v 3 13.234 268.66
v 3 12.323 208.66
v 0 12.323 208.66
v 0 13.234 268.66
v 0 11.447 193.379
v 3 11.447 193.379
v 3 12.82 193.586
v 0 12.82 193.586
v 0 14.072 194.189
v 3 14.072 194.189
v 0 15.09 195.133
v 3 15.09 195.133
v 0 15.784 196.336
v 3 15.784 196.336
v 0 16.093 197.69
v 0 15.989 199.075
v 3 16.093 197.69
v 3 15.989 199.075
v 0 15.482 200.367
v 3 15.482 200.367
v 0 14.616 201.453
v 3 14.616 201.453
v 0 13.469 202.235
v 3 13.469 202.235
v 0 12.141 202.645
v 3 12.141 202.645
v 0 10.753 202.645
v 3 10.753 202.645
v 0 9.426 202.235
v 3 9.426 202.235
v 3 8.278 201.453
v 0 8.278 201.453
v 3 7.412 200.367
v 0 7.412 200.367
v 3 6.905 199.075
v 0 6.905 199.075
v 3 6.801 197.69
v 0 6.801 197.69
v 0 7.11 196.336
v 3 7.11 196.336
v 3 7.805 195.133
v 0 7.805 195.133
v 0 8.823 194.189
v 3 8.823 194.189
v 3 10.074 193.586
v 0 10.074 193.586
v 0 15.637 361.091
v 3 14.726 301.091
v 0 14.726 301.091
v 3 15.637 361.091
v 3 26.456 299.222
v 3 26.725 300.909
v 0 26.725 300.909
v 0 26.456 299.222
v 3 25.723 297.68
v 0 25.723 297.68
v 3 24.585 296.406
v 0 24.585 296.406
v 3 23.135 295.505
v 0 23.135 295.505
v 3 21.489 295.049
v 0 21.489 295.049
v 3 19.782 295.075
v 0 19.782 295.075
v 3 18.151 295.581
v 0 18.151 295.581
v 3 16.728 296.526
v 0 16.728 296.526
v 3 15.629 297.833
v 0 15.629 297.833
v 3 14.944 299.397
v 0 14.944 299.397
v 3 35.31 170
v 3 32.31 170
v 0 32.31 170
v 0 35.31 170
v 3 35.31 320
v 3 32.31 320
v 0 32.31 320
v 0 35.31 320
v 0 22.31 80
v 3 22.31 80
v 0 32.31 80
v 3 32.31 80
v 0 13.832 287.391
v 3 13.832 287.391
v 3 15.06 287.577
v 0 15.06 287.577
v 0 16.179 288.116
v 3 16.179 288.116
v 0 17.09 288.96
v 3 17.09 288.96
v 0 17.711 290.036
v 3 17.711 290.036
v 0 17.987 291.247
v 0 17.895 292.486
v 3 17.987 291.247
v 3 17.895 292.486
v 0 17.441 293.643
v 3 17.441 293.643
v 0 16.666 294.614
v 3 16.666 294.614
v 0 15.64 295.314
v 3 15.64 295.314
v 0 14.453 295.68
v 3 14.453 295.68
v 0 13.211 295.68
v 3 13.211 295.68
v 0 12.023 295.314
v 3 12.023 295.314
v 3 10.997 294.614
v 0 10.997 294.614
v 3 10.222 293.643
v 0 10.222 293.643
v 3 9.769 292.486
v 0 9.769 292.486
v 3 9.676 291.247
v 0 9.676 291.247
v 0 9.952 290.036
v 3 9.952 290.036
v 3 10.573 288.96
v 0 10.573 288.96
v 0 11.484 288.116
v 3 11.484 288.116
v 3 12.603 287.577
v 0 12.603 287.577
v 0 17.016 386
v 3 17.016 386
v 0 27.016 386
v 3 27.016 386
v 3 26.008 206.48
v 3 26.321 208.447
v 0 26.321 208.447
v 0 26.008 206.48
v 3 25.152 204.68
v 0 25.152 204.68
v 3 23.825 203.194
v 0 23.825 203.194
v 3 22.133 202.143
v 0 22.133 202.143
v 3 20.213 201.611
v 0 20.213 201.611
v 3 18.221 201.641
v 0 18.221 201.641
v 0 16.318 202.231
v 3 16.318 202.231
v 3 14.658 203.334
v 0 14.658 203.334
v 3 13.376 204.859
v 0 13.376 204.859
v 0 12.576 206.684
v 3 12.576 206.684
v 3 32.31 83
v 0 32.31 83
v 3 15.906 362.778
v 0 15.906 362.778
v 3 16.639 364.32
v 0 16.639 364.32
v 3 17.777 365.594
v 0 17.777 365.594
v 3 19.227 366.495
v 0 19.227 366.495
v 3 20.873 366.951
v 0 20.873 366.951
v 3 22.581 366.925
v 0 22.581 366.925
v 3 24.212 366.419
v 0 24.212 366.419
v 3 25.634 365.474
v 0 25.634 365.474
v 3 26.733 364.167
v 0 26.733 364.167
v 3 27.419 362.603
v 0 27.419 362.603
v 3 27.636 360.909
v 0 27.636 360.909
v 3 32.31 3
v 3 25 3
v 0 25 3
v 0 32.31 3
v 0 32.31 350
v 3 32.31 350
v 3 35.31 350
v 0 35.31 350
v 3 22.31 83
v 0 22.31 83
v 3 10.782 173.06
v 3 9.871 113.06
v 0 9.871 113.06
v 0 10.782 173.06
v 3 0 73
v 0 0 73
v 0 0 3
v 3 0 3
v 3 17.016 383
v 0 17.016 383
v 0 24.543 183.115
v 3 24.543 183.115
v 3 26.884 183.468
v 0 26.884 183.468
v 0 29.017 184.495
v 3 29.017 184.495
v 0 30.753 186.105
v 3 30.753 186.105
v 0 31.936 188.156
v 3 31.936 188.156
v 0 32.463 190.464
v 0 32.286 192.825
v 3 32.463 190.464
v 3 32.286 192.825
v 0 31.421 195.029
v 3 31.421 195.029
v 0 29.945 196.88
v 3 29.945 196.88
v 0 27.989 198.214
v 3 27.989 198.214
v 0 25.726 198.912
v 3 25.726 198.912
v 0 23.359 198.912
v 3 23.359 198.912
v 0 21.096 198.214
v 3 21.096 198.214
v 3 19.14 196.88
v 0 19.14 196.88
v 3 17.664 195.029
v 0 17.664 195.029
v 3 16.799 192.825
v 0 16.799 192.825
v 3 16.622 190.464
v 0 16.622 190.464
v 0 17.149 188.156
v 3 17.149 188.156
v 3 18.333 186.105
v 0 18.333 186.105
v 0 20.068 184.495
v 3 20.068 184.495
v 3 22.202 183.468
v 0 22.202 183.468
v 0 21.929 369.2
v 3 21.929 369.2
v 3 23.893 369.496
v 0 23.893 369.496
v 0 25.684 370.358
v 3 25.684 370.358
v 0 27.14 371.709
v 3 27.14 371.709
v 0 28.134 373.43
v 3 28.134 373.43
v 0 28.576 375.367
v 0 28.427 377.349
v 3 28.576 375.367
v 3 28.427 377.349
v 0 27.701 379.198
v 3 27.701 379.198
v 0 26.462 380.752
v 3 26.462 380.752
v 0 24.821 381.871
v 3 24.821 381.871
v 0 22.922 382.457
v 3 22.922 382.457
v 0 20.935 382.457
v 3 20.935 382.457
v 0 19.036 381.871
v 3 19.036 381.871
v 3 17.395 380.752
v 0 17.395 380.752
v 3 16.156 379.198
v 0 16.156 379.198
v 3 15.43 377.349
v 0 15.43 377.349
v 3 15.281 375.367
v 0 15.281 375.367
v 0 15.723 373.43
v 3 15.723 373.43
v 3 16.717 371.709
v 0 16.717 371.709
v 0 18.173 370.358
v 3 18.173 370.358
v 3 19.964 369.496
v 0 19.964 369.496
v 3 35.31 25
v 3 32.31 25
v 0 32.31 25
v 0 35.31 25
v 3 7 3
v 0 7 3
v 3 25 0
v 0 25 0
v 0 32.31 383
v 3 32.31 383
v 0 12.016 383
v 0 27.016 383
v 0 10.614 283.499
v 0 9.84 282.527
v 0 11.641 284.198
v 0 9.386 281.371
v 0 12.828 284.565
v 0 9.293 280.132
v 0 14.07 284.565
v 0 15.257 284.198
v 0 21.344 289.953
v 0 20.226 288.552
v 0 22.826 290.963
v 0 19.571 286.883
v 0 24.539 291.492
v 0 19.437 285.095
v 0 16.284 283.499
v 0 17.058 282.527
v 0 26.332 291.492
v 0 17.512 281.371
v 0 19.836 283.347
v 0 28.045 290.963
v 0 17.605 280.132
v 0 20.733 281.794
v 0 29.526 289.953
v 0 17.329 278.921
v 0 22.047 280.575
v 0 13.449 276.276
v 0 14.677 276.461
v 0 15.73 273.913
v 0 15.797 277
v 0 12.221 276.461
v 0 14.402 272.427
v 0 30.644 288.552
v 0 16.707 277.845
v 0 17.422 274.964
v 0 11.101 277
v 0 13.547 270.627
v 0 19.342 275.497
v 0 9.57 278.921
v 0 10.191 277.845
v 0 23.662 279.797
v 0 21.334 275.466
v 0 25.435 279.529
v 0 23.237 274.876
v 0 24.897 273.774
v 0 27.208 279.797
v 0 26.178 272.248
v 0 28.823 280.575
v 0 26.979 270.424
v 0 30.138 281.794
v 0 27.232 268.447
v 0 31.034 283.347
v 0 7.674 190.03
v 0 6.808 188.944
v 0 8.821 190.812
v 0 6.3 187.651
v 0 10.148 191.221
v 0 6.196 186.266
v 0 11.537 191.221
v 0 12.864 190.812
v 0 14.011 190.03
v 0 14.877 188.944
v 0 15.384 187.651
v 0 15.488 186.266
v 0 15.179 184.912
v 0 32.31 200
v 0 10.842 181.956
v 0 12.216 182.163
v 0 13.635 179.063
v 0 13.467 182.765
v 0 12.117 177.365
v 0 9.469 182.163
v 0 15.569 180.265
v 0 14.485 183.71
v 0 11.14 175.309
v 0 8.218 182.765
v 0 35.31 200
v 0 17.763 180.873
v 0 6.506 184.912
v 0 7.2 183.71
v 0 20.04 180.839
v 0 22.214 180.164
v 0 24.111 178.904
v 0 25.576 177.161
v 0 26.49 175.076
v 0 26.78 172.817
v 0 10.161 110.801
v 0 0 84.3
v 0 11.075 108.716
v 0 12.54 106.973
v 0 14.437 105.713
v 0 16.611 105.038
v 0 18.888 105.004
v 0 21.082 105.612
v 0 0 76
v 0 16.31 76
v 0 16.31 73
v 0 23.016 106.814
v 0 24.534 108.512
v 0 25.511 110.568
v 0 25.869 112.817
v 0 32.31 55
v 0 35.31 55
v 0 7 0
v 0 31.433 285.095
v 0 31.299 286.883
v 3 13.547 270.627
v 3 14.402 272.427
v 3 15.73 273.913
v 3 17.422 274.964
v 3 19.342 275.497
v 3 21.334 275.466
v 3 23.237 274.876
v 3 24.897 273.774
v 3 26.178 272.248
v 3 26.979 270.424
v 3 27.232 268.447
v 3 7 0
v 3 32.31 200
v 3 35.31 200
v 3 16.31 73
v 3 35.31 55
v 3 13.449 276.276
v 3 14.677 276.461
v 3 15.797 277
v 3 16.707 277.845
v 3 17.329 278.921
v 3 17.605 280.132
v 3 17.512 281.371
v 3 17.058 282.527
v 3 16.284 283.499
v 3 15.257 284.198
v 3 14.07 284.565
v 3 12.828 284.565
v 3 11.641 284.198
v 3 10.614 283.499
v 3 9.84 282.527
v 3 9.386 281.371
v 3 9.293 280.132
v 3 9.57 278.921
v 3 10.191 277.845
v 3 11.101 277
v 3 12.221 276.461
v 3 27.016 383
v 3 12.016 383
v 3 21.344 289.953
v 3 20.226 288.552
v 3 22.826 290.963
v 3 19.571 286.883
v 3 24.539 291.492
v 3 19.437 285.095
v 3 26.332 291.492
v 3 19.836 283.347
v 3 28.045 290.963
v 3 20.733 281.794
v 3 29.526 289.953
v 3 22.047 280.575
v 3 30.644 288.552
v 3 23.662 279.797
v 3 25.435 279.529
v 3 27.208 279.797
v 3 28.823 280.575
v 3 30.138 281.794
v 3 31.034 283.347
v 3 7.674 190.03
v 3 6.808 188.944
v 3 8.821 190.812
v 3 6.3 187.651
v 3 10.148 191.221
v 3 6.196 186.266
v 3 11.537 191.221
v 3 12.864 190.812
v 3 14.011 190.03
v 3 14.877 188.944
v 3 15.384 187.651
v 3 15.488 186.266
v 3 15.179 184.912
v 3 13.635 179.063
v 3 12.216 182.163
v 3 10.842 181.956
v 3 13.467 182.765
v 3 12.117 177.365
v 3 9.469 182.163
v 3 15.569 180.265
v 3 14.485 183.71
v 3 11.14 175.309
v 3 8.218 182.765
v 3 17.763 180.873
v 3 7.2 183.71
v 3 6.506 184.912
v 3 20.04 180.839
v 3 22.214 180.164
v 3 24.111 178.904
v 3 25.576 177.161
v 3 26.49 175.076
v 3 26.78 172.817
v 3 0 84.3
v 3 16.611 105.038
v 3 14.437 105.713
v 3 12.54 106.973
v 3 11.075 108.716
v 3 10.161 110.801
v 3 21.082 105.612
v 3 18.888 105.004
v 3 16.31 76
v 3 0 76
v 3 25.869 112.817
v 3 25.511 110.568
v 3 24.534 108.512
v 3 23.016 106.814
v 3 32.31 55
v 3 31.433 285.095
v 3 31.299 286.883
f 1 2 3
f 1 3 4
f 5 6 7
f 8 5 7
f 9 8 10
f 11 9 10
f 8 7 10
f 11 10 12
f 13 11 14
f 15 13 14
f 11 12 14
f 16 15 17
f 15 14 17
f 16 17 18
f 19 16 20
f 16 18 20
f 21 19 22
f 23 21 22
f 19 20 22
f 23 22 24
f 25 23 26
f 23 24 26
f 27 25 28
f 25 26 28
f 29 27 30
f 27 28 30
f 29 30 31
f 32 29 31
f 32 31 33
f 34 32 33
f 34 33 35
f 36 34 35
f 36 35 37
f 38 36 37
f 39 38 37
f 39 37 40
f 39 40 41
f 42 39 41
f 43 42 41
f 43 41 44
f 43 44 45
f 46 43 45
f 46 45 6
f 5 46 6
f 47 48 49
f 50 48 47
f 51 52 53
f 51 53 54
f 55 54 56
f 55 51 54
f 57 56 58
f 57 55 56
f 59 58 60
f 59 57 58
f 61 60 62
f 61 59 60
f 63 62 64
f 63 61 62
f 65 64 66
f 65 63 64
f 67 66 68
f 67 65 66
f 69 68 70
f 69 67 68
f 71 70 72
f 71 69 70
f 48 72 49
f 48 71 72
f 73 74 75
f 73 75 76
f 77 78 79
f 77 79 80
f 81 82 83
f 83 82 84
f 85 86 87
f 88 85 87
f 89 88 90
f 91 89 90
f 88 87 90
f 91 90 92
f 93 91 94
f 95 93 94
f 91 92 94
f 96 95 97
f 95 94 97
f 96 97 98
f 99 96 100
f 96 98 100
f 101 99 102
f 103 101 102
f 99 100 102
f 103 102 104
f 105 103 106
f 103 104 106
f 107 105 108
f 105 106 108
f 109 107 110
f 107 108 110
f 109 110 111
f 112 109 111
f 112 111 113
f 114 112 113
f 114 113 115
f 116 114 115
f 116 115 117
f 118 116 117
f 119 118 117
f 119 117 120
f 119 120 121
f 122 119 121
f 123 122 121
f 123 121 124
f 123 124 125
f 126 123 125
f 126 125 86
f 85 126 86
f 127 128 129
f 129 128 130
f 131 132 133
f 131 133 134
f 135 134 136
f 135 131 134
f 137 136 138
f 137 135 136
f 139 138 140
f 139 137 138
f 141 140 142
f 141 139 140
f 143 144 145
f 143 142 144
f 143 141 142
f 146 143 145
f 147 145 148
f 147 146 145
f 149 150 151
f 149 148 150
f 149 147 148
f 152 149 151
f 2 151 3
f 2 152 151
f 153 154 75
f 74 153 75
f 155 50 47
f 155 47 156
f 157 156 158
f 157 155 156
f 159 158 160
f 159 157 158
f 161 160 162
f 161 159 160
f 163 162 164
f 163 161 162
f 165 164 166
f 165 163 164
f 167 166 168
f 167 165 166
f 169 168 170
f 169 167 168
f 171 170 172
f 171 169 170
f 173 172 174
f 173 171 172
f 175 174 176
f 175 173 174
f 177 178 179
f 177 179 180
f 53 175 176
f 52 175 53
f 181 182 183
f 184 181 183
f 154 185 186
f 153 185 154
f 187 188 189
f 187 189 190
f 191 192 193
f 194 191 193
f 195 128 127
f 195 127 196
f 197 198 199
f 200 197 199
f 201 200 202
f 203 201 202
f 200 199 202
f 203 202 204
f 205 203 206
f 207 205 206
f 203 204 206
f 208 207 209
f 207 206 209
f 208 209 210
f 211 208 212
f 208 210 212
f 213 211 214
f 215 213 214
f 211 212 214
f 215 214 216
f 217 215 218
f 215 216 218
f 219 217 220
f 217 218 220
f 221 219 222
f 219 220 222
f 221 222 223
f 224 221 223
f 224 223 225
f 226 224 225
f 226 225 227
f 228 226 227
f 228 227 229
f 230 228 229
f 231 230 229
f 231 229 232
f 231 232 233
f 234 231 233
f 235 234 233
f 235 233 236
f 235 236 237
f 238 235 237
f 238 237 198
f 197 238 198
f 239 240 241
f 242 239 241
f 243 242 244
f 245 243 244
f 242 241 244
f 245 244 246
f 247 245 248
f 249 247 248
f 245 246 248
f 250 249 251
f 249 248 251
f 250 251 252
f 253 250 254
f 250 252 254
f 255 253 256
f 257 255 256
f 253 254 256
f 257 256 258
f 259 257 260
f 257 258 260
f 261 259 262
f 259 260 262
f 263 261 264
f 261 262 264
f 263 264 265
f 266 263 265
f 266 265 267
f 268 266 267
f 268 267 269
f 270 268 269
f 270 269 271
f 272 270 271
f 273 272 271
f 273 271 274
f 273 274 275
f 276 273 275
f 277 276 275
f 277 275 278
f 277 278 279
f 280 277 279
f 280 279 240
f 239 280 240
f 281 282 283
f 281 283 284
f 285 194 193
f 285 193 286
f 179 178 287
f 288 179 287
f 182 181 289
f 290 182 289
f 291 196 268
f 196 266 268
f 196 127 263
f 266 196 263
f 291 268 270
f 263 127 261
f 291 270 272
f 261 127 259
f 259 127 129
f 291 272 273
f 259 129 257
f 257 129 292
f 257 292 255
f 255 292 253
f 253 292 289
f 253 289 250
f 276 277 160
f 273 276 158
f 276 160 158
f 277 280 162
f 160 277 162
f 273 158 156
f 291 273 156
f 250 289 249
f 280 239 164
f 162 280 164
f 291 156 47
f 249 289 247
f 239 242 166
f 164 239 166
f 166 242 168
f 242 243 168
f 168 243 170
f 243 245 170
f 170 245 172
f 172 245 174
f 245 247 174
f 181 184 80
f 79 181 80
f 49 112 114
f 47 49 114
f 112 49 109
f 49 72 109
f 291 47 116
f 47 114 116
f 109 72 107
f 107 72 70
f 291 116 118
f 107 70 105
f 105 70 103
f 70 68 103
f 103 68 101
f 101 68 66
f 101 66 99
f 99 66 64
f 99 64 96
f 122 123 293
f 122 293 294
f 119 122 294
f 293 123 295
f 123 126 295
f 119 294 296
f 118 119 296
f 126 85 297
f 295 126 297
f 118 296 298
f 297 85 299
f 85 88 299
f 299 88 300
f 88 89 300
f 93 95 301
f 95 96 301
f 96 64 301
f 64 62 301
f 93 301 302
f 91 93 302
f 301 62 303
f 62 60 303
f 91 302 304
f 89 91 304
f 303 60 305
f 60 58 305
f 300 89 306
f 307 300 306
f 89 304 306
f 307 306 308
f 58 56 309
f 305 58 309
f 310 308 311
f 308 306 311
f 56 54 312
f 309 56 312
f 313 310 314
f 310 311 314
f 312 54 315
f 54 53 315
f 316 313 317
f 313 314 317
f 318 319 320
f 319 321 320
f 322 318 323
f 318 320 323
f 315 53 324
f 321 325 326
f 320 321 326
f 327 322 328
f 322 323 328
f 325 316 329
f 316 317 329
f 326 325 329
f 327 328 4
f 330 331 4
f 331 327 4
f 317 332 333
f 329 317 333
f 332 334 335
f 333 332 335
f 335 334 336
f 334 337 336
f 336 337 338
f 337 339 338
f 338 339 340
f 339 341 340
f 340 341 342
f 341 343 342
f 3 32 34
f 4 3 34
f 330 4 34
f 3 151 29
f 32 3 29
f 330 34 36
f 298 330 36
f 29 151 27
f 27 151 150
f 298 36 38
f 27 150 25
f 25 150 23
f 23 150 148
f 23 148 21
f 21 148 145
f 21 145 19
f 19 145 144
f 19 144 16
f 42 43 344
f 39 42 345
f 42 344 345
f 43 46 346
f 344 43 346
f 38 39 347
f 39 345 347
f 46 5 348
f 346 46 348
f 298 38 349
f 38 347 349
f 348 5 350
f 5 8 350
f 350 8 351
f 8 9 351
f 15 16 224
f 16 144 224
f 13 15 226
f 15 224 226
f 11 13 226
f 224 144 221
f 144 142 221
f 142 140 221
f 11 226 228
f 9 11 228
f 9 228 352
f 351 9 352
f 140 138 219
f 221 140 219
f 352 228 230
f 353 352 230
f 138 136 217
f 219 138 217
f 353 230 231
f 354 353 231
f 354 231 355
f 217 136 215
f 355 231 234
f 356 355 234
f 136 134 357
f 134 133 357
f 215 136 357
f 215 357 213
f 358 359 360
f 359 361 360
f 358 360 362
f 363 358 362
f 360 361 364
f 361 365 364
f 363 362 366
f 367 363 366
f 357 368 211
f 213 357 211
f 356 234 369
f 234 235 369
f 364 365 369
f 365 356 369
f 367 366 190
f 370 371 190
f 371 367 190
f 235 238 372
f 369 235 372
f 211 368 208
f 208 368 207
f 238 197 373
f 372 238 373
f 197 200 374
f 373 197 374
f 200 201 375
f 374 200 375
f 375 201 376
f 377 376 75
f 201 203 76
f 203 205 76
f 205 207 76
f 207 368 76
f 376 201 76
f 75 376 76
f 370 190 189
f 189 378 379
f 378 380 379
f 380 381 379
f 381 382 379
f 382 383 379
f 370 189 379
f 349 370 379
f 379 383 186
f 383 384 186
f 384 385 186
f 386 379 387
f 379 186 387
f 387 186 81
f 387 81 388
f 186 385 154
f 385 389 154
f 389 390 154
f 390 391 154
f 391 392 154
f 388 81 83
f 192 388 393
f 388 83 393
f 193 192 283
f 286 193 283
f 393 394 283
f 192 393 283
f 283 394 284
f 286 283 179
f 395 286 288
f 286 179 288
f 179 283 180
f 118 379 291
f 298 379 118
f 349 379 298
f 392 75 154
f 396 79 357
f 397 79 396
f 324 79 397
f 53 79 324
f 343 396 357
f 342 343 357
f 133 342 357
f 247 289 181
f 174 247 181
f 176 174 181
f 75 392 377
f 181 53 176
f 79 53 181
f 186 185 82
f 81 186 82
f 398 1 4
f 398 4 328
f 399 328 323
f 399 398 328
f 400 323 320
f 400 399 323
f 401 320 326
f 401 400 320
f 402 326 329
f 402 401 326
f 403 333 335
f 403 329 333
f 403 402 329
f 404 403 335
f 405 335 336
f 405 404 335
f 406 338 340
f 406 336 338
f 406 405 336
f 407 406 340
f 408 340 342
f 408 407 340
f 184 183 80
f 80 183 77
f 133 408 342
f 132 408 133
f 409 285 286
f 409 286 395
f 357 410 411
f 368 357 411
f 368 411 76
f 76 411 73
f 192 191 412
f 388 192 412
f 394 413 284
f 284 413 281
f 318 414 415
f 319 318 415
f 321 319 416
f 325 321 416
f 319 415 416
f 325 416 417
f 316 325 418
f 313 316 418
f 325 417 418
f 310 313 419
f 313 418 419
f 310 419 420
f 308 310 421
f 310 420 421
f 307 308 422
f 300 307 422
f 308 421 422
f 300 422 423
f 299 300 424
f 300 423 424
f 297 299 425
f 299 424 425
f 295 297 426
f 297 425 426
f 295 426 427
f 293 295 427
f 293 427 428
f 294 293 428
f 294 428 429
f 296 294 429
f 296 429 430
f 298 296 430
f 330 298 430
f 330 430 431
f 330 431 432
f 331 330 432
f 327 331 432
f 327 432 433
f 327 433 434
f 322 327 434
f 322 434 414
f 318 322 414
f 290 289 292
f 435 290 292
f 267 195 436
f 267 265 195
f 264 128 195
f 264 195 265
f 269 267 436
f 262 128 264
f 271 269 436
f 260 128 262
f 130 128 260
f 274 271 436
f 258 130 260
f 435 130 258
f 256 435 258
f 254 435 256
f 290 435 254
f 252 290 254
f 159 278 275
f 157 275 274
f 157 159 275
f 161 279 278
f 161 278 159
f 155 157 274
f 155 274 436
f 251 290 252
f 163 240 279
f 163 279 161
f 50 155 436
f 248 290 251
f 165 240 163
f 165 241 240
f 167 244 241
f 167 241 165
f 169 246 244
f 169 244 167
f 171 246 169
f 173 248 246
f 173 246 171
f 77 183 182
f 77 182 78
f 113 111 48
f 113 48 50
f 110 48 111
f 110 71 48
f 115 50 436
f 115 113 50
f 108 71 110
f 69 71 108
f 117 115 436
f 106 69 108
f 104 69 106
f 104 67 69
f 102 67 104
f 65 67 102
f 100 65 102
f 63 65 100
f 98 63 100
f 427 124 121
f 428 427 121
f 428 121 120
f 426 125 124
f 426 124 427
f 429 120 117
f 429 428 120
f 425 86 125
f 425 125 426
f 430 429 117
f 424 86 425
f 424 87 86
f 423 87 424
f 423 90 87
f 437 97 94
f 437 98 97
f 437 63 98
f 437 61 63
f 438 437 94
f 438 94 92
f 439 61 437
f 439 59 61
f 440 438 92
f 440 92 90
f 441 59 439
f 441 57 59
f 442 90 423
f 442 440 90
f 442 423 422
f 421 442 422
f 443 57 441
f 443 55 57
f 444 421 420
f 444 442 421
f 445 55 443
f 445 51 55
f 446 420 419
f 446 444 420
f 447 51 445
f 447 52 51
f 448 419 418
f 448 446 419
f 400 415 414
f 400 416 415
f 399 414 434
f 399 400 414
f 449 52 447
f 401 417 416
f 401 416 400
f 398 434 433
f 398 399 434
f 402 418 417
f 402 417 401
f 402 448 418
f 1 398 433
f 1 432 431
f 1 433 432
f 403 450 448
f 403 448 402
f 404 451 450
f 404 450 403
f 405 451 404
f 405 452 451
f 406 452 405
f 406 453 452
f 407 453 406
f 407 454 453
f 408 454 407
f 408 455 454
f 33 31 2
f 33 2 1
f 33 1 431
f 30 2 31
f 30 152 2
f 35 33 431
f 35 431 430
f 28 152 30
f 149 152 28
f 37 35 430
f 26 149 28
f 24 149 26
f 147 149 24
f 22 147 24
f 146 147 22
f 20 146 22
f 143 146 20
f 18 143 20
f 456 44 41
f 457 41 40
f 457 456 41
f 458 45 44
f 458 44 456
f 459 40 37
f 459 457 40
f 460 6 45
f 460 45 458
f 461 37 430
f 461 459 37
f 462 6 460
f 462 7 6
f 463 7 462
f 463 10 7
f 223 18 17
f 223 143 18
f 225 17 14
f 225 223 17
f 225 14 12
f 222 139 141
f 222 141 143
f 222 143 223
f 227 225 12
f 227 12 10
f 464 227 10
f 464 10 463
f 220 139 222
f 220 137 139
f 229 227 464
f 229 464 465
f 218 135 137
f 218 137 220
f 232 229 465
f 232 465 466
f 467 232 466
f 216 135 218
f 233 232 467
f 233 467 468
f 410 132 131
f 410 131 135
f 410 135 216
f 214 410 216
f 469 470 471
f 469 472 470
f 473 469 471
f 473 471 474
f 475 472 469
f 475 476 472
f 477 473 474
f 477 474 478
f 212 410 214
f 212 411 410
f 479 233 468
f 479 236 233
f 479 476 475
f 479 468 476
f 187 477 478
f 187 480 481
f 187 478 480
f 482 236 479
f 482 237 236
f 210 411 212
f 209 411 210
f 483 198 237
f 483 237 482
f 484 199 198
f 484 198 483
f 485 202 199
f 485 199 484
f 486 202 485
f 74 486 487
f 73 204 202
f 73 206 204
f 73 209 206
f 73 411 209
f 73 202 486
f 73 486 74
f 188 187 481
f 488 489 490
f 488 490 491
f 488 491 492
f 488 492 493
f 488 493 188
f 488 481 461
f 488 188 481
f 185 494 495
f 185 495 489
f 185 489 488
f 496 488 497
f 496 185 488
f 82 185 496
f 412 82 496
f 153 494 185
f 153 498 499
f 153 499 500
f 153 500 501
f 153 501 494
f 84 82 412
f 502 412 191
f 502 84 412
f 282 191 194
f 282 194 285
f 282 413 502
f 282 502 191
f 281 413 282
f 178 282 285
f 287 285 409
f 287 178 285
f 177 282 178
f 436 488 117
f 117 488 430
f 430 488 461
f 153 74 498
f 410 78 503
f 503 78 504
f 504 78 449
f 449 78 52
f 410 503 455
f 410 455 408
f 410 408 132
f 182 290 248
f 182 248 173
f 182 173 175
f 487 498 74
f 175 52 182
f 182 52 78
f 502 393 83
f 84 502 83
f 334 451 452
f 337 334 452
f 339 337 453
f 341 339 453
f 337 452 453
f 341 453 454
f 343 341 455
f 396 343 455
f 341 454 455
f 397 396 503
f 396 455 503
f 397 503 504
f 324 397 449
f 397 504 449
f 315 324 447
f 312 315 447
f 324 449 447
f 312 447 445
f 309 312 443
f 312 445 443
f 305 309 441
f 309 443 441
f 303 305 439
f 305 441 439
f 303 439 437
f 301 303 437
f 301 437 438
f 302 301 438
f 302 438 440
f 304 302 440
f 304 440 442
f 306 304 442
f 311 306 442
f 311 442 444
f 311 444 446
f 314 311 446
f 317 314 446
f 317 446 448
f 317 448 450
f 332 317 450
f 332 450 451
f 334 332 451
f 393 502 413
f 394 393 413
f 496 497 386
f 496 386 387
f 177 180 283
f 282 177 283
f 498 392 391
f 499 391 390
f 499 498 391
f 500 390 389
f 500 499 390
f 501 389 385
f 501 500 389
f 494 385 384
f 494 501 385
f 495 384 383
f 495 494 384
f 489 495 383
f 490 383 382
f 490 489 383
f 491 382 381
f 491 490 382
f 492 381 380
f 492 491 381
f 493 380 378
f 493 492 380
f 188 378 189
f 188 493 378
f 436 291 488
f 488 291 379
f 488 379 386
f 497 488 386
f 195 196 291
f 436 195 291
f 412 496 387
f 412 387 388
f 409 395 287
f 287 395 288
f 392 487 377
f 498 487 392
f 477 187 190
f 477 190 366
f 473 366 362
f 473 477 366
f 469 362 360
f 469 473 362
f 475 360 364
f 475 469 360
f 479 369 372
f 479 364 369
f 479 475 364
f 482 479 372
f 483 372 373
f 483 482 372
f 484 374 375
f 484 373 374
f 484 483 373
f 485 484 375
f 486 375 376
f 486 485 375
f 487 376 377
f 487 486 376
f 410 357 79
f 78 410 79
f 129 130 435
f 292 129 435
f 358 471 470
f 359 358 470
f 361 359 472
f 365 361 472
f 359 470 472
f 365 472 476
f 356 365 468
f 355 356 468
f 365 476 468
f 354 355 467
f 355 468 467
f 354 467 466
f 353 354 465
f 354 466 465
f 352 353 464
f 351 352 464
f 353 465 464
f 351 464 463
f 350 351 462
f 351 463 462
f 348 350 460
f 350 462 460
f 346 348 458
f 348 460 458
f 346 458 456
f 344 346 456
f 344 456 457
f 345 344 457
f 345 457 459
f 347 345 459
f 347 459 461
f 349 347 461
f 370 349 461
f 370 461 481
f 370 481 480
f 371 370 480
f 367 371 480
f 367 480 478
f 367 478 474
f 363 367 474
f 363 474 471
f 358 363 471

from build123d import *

# Parameters (mm, degrees)
BOSS_EXTRUDE1_DEPTH = 3
SKETCH2_W           = 3
SKETCH2_H           = 10
SKETCH2_W_2         = 30
SKETCH2_H_2         = 3
BOSS_EXTRUDE2_DEPTH = 3
CUT_EXTRUDE1_DEPTH  = 10
SKETCH4_W           = 3
SKETCH4_H           = 10
SKETCH4_H_2         = 16.31
CUT_EXTRUDE2_DEPTH  = 10
SKETCH5_W           = 3
SKETCH5_H           = 13.703534411
SKETCH5_H_2         = 13.791377581
CUT_EXTRUDE3_DEPTH  = 10
SKETCH6_R           = 6.665876203
SKETCH6_R_2         = 6.014739453
SKETCH6_R_3         = 4.167493344
SKETCH6_R_4         = 7.942691131
SKETCH6_R_5         = 4.658905865
CUT_EXTRUDE4_DEPTH  = 10


with BuildPart() as part:
    # Sketch1 → Boss-Extrude1 (new body)
    with BuildSketch(Plane(origin=(0, 0, 0), x_dir=(0, 0, -1), z_dir=(1, 0, 0))):
        Polygon((-383, 12.016330065), (-84.3, 0), (0, 0), (0, 32.31), (-383, 32.31), align=None)
    extrude(amount=BOSS_EXTRUDE1_DEPTH)

    # Sketch2 → Boss-Extrude2 (add)
    with BuildSketch(Plane(origin=(3, 0, 0), x_dir=(0, 0, -1), z_dir=(1, 0, 0))):
        with Locations((-384.5, 22.016330065)):
            Rectangle(SKETCH2_W, SKETCH2_H)
        with Locations((-335, 33.81)):
            Rectangle(SKETCH2_W_2, SKETCH2_H_2)
        with Locations((-40, 33.81)):
            Rectangle(SKETCH2_W_2, SKETCH2_H_2)
        with Locations((-185, 33.81)):
            Rectangle(SKETCH2_W_2, SKETCH2_H_2)
    extrude(amount=-BOSS_EXTRUDE2_DEPTH)

    # Sketch3 → Cut-Extrude1 (cut)
    with BuildSketch(Plane(origin=(3, 0, 0), x_dir=(0, 0, -1), z_dir=(1, 0, 0))):
        with BuildLine():
            Line((-360.908901745, 27.636018628), (-300.908901745, 26.724931053))
            ThreePointArc((-300.908901745, 26.724931053), (-295.000691614, 20.634524412), (-301.091098255, 14.726314282))
            Line((-301.091098255, 14.726314282), (-361.091098255, 15.637401857))
            ThreePointArc((-361.091098255, 15.637401857), (-366.999308386, 21.727808498), (-360.908901745, 27.636018628))
        make_face()
        with BuildLine():
            Line((-268.447308122, 27.232123759), (-208.447308122, 26.321036184))
            ThreePointArc((-208.447308122, 26.321036184), (-201.554396303, 19.215561769), (-208.659870718, 12.32264995))
            Line((-208.659870718, 12.32264995), (-268.659870718, 13.233737525))
            ThreePointArc((-268.659870718, 13.233737525), (-275.552782537, 20.33921194), (-268.447308122, 27.232123759))
        make_face()
        with BuildLine():
            Line((-172.817042181, 26.780113256), (-112.817042181, 25.869025681))
            ThreePointArc((-112.817042181, 25.869025681), (-104.939428674, 17.748483493), (-113.059970863, 9.870869986))
            Line((-113.059970863, 9.870869986), (-173.059970863, 10.781957561))
            ThreePointArc((-173.059970863, 10.781957561), (-180.93758437, 18.902499749), (-172.817042181, 26.780113256))
        make_face()
    extrude(amount=-CUT_EXTRUDE1_DEPTH, mode=Mode.SUBTRACT)

    # Sketch4 → Cut-Extrude2 (cut)
    with BuildSketch(Plane(origin=(3, 0, 0), x_dir=(0, 0, -1), z_dir=(1, 0, 0))):
        with Locations((-81.5, 27.31)):
            Rectangle(SKETCH4_W, SKETCH4_H)
        with Locations((-74.5, 8.155)):
            Rectangle(SKETCH4_W, SKETCH4_H_2)
    extrude(amount=-CUT_EXTRUDE2_DEPTH, mode=Mode.SUBTRACT)

    # Sketch5 → Cut-Extrude3 (cut)
    with BuildSketch(Plane(origin=(3, 0, 0), x_dir=(0, 0, -1), z_dir=(1, 0, 0))):
        with Locations((-1.5, 31.851767205)):
            Rectangle(SKETCH5_W, SKETCH5_H)
        with Locations((-1.5, 0.104311209)):
            Rectangle(SKETCH5_W, SKETCH5_H_2)
    extrude(amount=-CUT_EXTRUDE3_DEPTH, mode=Mode.SUBTRACT)

    # Sketch6 → Cut-Extrude4 (cut)
    with BuildSketch(Plane(origin=(3, 0, 0), x_dir=(0, 0, -1), z_dir=(1, 0, 0))):
        with Locations((-375.865428414, 21.928511603)):
            Circle(SKETCH6_R)
        with Locations((-285.544135062, 25.435251305)):
            Circle(SKETCH6_R_2)
        with Locations((-280.443646207, 13.449102496)):
            Circle(SKETCH6_R_3)
        with Locations((-291.558874515, 13.83163916)):
            Circle(SKETCH6_R_3)
        with Locations((-191.057579024, 24.542665756)):
            Circle(SKETCH6_R_4)
        with Locations((-186.614565866, 10.842366657)):
            Circle(SKETCH6_R_5)
        with Locations((-198.037933391, 11.447109955)):
            Circle(SKETCH6_R_5)
    extrude(amount=-CUT_EXTRUDE4_DEPTH, mode=Mode.SUBTRACT)


solid = part.part
